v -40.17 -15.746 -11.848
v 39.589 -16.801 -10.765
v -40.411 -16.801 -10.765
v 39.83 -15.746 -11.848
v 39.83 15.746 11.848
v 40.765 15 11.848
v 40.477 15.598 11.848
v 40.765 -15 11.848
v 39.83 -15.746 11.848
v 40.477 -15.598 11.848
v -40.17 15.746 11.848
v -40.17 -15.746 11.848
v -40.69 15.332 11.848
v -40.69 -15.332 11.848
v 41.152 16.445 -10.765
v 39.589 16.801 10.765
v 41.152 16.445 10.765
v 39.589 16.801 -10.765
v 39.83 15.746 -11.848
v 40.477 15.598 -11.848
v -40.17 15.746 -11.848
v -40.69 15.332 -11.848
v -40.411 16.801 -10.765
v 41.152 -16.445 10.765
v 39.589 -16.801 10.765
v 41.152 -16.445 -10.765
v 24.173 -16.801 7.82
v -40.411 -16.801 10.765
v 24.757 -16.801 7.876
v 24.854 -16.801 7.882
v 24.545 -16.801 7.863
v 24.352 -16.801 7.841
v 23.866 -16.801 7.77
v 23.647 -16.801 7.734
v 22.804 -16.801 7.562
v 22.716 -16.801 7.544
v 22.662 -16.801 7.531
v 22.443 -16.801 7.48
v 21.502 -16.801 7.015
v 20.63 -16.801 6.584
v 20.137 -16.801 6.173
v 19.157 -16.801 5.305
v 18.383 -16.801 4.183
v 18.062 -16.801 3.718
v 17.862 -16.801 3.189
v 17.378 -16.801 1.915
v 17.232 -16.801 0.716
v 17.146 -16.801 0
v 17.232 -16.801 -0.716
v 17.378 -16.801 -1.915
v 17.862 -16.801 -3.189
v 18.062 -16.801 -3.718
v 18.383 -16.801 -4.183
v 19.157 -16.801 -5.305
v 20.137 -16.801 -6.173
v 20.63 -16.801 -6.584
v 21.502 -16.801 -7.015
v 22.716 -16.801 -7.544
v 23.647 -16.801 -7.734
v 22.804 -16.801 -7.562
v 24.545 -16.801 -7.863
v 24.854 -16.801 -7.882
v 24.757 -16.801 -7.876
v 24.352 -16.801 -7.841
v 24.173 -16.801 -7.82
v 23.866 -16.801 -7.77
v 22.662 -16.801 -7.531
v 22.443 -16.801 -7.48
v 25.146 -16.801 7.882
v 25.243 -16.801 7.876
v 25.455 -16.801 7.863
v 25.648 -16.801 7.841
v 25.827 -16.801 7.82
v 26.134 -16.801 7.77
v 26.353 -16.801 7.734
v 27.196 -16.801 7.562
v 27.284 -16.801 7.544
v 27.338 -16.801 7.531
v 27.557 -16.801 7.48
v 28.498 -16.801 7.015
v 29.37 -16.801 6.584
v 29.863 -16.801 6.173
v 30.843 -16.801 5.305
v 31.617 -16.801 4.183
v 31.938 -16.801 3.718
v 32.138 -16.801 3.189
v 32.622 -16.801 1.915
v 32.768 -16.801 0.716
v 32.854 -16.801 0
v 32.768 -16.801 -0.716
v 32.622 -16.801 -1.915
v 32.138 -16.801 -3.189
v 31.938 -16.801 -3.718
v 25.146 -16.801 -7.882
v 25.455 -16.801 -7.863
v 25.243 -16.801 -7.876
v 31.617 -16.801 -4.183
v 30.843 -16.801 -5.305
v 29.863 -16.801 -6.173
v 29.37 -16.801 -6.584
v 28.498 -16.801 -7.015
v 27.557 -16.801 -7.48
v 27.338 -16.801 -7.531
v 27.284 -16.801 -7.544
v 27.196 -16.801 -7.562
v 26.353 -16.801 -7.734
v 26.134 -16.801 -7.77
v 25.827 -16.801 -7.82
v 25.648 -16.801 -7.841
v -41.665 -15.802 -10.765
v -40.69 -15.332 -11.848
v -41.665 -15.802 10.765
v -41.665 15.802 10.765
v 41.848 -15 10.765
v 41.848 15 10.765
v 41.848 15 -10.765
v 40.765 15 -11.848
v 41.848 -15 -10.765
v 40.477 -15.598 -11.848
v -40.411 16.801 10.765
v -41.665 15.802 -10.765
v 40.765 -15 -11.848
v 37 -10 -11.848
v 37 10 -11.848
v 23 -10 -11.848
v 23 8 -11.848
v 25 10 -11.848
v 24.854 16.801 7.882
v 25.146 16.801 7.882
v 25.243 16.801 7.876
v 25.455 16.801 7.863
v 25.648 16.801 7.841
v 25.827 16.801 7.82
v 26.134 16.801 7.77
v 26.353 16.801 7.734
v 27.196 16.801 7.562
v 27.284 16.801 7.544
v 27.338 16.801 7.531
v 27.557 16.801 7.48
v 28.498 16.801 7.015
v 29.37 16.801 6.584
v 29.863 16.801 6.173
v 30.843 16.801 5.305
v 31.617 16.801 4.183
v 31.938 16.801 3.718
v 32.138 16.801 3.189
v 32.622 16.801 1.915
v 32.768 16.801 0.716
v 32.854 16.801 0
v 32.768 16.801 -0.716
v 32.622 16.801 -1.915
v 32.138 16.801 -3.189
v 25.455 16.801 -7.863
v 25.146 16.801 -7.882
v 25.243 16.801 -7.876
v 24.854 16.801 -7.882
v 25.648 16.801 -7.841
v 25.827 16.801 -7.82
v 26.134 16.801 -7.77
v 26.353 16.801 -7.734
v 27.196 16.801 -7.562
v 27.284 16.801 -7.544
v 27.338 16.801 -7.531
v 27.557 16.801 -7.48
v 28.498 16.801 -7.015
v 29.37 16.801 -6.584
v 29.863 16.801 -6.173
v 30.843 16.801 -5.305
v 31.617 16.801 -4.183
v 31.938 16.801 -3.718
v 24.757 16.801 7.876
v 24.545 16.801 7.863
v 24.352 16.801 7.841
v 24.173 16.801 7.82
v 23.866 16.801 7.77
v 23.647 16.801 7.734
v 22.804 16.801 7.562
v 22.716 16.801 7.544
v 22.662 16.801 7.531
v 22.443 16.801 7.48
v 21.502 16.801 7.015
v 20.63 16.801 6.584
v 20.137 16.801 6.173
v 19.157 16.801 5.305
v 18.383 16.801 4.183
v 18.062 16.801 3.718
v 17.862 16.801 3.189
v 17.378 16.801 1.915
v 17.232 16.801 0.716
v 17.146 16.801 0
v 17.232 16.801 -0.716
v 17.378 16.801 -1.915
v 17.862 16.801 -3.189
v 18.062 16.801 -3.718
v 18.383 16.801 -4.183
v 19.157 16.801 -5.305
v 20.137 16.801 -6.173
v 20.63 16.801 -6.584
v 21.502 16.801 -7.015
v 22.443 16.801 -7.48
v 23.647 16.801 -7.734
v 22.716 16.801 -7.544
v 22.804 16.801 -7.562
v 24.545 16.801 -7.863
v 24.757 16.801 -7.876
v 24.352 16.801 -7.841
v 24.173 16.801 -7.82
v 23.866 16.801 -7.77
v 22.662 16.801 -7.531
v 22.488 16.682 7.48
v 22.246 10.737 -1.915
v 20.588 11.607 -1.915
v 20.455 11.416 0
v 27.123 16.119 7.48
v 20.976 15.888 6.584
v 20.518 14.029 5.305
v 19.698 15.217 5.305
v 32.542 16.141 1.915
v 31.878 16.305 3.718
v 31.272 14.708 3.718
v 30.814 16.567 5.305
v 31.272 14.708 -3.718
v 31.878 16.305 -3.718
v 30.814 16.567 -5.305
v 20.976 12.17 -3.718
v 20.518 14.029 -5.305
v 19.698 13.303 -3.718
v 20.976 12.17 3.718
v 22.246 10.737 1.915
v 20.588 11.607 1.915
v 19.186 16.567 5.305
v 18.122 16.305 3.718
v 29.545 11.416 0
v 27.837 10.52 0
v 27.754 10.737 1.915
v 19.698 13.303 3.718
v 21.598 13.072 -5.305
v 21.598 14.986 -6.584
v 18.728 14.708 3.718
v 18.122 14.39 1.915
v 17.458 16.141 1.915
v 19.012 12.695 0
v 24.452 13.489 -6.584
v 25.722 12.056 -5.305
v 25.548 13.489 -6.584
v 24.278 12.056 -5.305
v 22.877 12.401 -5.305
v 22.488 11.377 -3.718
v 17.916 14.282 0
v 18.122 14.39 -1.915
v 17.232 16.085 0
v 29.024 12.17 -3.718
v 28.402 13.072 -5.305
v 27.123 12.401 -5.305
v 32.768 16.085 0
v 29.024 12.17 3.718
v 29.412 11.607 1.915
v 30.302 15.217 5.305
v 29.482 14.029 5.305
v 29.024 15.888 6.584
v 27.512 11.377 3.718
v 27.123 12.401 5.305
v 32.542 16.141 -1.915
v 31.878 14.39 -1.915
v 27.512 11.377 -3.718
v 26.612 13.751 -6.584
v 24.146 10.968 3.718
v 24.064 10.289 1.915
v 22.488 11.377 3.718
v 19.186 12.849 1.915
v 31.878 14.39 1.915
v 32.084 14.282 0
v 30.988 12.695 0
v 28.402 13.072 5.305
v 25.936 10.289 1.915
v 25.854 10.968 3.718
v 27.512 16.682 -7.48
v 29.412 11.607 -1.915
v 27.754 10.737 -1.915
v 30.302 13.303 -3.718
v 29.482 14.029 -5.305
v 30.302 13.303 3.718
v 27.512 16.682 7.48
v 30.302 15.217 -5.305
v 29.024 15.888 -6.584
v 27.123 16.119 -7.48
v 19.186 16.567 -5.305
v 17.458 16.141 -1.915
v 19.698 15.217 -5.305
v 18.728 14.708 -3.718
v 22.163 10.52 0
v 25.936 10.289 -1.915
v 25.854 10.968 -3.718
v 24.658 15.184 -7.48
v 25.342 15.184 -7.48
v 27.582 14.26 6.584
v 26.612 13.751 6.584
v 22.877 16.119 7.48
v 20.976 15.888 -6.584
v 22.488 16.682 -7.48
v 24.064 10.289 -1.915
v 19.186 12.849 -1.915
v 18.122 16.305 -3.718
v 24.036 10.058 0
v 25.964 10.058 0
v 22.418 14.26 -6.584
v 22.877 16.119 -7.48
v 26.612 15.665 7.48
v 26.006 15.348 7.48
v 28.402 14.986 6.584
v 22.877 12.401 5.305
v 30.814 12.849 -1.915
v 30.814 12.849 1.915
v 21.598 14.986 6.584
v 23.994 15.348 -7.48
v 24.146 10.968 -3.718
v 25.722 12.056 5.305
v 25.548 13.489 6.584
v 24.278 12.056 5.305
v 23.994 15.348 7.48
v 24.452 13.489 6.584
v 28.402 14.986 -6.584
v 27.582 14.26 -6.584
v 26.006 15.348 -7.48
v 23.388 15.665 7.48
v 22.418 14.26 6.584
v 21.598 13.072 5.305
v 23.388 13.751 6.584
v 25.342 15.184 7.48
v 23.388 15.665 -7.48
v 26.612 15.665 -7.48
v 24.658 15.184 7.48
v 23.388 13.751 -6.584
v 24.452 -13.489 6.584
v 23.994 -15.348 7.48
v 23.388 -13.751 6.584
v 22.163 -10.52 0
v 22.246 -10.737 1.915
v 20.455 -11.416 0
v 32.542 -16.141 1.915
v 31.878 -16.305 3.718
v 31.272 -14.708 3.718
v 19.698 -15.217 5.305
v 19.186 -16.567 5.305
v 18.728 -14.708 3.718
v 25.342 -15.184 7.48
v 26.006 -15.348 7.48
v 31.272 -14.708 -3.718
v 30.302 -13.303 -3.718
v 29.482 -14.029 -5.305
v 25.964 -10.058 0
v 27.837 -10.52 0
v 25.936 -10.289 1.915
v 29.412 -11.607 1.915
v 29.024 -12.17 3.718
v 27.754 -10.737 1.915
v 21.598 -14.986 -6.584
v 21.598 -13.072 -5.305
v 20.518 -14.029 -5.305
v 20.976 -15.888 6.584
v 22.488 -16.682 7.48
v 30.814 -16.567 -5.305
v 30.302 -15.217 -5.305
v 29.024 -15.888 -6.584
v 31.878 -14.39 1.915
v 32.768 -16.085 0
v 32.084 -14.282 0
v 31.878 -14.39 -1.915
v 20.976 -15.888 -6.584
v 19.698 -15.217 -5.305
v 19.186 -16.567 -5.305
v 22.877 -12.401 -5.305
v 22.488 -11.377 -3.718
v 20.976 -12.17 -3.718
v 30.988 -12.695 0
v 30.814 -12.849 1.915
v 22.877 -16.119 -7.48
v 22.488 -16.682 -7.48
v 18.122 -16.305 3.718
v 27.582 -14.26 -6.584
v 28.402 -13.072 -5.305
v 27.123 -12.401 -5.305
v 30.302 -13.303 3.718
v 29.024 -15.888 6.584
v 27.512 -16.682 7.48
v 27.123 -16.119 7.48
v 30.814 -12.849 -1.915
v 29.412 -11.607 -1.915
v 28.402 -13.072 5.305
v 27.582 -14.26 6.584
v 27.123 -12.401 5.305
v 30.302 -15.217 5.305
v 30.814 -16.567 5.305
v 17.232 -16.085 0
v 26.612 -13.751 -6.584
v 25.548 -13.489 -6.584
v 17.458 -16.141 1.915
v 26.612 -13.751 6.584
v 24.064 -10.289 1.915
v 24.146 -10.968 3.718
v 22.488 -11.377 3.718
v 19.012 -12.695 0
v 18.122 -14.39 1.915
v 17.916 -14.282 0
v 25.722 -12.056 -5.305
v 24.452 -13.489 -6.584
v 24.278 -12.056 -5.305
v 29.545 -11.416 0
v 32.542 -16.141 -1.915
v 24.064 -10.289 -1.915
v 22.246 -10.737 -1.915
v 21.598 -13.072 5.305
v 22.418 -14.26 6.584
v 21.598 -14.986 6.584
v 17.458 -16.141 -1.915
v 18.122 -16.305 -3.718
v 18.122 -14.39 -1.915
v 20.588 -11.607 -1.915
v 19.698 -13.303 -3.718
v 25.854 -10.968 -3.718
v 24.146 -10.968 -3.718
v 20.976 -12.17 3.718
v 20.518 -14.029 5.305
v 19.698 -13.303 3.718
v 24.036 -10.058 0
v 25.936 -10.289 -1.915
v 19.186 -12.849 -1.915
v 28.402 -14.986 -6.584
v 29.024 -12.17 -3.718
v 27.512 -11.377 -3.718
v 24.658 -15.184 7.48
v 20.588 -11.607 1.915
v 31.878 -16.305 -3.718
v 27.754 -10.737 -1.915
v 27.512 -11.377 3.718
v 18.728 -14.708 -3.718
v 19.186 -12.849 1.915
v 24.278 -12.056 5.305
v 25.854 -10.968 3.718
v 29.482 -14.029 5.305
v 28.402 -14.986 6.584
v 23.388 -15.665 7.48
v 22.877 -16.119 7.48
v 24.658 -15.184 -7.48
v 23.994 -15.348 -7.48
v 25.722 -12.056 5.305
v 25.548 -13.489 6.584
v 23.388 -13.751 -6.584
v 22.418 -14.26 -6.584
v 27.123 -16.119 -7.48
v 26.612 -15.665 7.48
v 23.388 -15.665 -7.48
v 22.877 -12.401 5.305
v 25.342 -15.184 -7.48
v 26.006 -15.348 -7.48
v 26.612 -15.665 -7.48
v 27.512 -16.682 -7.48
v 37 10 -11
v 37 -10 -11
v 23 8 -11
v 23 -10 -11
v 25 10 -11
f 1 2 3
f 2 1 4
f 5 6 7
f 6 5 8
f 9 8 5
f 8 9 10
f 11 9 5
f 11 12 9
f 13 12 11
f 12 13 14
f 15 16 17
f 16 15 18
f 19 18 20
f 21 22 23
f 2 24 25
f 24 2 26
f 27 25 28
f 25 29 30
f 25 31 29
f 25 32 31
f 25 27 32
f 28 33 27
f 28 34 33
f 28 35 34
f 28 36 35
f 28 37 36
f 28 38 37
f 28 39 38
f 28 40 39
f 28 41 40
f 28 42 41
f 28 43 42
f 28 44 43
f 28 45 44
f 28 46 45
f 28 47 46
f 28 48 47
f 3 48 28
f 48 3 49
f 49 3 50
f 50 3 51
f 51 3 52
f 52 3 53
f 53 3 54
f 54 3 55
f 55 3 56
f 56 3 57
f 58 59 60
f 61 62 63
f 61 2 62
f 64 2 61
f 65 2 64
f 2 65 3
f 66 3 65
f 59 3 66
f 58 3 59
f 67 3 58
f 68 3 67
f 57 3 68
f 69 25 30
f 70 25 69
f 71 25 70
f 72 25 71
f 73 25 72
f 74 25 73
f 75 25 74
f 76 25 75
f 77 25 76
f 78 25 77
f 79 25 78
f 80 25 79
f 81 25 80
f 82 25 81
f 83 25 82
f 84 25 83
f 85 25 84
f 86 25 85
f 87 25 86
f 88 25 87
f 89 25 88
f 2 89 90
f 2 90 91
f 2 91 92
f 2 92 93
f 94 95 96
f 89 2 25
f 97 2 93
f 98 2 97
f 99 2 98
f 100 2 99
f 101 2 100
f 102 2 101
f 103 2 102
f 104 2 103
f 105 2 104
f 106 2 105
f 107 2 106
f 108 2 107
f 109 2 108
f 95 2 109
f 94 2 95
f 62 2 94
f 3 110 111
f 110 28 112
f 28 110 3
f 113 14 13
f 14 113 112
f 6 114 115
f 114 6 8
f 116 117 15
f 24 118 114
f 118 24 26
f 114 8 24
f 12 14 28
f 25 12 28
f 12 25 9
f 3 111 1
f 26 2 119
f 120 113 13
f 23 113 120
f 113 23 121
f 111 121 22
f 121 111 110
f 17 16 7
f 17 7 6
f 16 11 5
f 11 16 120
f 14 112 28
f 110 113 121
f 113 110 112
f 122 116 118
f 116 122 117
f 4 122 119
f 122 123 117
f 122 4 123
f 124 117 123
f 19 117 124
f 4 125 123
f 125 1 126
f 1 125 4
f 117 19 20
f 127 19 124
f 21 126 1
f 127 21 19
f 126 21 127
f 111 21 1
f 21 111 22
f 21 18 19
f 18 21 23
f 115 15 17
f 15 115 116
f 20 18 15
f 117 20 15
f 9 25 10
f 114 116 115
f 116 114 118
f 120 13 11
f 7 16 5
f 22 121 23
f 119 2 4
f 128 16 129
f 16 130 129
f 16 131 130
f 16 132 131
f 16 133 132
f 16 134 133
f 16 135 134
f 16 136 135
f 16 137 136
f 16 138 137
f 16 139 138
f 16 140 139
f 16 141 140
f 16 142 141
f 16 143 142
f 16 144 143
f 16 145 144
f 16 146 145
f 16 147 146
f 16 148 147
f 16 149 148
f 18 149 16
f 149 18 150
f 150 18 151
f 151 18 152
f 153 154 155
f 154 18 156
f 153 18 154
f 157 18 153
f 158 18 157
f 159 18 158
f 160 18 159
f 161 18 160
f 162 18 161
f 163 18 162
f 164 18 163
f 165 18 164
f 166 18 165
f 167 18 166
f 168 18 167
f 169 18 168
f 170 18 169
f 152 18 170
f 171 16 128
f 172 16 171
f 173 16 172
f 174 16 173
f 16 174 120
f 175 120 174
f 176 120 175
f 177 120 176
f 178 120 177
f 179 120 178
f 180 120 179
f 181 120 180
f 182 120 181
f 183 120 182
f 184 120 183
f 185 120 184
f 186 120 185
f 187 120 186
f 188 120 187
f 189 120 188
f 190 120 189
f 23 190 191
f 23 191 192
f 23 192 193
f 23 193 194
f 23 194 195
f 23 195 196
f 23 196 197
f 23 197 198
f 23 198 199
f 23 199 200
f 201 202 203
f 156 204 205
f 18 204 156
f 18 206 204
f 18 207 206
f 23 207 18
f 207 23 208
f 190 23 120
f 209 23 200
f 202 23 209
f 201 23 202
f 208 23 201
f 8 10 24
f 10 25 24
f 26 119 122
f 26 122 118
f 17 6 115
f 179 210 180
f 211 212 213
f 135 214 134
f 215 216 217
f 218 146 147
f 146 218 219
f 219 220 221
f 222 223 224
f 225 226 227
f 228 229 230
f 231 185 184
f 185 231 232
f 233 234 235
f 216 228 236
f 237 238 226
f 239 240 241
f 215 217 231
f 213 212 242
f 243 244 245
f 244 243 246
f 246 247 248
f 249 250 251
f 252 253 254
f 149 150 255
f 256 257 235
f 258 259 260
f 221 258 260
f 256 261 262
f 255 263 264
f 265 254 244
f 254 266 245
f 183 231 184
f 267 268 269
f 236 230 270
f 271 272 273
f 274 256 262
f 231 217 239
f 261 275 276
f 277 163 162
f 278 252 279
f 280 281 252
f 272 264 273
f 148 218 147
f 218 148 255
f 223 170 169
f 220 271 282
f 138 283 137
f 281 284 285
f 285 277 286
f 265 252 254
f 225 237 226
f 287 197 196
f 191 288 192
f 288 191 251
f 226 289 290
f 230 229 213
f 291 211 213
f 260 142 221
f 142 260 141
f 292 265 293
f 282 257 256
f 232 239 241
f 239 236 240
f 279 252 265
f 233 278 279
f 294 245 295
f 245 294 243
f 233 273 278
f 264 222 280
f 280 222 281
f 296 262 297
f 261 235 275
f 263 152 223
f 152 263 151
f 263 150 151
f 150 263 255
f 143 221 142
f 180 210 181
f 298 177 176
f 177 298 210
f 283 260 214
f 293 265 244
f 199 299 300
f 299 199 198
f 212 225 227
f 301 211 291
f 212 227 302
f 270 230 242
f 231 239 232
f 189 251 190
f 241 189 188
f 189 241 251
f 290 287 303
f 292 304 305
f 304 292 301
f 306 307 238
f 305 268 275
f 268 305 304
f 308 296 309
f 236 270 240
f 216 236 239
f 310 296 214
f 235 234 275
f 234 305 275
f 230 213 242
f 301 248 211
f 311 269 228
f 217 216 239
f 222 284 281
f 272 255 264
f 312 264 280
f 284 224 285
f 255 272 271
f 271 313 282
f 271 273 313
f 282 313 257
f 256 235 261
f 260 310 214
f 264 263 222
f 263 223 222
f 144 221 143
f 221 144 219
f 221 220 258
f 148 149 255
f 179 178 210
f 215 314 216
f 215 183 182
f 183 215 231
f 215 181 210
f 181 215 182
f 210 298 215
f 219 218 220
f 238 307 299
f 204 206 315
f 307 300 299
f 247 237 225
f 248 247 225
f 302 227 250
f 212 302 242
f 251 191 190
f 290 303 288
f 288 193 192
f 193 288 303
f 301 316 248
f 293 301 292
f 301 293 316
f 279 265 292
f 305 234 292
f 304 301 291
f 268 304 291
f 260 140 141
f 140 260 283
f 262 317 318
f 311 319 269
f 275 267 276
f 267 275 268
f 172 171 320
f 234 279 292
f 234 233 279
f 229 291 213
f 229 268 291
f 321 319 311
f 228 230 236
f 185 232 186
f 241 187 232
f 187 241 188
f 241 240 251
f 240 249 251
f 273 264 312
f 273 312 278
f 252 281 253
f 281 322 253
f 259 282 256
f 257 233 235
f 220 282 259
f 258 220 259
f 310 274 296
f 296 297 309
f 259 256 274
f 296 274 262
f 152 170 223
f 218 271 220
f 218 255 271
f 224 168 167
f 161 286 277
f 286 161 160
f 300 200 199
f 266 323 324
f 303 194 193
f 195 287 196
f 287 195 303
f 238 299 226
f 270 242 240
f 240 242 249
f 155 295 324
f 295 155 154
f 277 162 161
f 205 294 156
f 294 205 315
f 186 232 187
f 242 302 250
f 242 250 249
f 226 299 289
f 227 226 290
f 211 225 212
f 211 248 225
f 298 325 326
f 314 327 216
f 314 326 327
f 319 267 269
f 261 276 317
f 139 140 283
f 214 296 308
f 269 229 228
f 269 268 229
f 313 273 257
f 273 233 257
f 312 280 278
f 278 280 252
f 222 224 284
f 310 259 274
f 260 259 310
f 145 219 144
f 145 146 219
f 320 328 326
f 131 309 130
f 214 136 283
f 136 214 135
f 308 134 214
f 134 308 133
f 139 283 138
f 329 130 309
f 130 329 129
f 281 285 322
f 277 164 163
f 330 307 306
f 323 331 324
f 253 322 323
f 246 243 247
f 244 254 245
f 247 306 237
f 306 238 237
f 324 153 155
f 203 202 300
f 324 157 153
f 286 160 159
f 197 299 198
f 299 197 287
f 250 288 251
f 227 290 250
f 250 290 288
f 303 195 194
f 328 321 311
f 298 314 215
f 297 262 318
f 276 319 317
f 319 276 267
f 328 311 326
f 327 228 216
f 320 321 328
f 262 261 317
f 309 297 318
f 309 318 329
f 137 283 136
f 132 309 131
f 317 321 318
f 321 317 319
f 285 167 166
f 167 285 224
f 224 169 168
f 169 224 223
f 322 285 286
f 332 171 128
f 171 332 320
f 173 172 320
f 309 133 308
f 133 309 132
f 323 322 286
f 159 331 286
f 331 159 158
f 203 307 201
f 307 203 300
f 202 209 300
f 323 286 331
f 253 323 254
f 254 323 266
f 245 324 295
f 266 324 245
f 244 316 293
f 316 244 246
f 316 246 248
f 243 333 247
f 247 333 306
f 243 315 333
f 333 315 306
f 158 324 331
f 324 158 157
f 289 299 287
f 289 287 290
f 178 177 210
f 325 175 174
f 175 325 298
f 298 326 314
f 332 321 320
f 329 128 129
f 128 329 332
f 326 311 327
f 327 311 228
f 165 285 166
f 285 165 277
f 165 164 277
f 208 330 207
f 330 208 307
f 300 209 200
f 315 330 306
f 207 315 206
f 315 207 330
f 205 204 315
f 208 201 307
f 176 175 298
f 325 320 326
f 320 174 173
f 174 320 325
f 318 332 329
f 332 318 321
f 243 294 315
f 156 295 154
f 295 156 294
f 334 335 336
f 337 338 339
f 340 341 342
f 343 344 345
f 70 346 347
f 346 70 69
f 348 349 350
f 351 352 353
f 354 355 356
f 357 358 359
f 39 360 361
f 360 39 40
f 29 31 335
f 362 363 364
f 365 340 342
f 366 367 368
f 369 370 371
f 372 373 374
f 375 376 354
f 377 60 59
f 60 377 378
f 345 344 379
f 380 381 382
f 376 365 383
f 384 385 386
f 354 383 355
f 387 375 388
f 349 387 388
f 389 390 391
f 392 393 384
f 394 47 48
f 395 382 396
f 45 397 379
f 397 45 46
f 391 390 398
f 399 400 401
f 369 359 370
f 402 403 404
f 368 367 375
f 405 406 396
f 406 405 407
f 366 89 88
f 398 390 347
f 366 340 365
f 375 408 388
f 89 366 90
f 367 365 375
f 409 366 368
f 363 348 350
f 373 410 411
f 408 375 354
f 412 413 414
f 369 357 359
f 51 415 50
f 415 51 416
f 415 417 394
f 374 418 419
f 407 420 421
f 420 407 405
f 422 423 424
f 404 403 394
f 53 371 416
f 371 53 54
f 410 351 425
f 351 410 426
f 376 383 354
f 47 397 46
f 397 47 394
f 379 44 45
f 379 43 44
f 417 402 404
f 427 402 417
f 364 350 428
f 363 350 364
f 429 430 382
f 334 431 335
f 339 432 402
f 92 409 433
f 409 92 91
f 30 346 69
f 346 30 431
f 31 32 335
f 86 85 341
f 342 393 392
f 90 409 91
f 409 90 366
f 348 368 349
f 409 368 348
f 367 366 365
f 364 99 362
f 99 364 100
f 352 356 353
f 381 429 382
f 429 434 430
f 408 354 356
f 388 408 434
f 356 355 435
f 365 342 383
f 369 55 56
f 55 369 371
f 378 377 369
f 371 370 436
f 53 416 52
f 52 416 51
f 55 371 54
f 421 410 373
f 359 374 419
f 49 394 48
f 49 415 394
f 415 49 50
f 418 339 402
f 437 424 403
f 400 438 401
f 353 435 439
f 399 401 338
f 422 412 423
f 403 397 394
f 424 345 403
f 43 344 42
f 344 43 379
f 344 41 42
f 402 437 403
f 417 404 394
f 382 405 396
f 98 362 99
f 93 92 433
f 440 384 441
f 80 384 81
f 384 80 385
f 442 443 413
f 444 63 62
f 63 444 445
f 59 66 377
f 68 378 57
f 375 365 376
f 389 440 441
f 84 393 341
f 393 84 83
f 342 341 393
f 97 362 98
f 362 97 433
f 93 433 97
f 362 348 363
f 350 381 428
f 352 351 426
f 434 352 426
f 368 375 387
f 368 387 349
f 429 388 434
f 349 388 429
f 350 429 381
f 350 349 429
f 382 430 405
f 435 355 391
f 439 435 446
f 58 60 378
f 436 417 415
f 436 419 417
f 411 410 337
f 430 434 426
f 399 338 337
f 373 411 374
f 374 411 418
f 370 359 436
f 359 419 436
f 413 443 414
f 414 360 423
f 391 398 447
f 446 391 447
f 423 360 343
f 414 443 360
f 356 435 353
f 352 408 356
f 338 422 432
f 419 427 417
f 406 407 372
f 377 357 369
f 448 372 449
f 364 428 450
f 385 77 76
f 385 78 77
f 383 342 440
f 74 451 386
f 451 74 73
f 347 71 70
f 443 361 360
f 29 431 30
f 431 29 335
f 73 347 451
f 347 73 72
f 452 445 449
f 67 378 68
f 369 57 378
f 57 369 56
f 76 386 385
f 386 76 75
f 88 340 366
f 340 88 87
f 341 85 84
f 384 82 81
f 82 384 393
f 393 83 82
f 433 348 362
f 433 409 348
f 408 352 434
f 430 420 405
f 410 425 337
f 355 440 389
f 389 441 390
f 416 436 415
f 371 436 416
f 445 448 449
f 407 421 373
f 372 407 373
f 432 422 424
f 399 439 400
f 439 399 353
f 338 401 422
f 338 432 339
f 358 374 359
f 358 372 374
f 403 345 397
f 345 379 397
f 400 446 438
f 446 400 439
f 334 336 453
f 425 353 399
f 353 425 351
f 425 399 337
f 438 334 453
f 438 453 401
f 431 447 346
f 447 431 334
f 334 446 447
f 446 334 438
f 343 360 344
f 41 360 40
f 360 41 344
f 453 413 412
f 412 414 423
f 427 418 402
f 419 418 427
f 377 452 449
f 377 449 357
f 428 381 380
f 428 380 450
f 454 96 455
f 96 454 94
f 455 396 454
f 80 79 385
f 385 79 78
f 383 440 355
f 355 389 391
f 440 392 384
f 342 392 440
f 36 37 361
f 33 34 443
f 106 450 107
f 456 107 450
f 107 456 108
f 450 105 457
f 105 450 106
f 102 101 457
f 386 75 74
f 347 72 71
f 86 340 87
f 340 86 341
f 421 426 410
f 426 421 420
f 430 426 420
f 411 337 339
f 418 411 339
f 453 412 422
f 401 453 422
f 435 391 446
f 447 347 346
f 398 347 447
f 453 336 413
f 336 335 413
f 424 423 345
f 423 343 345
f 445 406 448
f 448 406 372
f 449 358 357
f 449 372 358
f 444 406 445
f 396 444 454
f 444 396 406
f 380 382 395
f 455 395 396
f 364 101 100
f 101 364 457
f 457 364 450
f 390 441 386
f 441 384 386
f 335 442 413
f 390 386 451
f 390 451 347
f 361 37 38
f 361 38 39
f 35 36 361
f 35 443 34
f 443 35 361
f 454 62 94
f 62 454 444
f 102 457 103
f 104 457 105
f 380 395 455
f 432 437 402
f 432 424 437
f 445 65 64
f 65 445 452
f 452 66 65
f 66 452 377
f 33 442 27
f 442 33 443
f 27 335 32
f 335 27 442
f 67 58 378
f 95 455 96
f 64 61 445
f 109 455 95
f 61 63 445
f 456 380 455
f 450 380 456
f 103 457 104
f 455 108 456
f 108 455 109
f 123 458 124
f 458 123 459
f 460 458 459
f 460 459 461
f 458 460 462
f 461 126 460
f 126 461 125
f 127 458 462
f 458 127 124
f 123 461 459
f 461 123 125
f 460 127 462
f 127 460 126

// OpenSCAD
// 80 x 30 x 20
module base() {
  hull() {
    for(x = [-40, 40]) {
      for(y = [-15, 15]) {
        for(z = [-10, 10]) {
          translate([x, y, z])
          sphere(2);
        }
      }
    }
  }
}

module base_with_speakers() {
  difference() {
    base();
  
    mirror([0, 1, 0])
    translate([25, -18, 0])
    sphere(8);
    
    translate([25, -18, 0])
    sphere(8);
  }
}


difference() {
  base_with_speakers();

  difference() {
    translate([30, 0, -12])
    cube([14, 20, 2], center=true);

    translate([22, 7, -12])
    rotate(45)
    cube([5, 5, 1]);
  }
}
